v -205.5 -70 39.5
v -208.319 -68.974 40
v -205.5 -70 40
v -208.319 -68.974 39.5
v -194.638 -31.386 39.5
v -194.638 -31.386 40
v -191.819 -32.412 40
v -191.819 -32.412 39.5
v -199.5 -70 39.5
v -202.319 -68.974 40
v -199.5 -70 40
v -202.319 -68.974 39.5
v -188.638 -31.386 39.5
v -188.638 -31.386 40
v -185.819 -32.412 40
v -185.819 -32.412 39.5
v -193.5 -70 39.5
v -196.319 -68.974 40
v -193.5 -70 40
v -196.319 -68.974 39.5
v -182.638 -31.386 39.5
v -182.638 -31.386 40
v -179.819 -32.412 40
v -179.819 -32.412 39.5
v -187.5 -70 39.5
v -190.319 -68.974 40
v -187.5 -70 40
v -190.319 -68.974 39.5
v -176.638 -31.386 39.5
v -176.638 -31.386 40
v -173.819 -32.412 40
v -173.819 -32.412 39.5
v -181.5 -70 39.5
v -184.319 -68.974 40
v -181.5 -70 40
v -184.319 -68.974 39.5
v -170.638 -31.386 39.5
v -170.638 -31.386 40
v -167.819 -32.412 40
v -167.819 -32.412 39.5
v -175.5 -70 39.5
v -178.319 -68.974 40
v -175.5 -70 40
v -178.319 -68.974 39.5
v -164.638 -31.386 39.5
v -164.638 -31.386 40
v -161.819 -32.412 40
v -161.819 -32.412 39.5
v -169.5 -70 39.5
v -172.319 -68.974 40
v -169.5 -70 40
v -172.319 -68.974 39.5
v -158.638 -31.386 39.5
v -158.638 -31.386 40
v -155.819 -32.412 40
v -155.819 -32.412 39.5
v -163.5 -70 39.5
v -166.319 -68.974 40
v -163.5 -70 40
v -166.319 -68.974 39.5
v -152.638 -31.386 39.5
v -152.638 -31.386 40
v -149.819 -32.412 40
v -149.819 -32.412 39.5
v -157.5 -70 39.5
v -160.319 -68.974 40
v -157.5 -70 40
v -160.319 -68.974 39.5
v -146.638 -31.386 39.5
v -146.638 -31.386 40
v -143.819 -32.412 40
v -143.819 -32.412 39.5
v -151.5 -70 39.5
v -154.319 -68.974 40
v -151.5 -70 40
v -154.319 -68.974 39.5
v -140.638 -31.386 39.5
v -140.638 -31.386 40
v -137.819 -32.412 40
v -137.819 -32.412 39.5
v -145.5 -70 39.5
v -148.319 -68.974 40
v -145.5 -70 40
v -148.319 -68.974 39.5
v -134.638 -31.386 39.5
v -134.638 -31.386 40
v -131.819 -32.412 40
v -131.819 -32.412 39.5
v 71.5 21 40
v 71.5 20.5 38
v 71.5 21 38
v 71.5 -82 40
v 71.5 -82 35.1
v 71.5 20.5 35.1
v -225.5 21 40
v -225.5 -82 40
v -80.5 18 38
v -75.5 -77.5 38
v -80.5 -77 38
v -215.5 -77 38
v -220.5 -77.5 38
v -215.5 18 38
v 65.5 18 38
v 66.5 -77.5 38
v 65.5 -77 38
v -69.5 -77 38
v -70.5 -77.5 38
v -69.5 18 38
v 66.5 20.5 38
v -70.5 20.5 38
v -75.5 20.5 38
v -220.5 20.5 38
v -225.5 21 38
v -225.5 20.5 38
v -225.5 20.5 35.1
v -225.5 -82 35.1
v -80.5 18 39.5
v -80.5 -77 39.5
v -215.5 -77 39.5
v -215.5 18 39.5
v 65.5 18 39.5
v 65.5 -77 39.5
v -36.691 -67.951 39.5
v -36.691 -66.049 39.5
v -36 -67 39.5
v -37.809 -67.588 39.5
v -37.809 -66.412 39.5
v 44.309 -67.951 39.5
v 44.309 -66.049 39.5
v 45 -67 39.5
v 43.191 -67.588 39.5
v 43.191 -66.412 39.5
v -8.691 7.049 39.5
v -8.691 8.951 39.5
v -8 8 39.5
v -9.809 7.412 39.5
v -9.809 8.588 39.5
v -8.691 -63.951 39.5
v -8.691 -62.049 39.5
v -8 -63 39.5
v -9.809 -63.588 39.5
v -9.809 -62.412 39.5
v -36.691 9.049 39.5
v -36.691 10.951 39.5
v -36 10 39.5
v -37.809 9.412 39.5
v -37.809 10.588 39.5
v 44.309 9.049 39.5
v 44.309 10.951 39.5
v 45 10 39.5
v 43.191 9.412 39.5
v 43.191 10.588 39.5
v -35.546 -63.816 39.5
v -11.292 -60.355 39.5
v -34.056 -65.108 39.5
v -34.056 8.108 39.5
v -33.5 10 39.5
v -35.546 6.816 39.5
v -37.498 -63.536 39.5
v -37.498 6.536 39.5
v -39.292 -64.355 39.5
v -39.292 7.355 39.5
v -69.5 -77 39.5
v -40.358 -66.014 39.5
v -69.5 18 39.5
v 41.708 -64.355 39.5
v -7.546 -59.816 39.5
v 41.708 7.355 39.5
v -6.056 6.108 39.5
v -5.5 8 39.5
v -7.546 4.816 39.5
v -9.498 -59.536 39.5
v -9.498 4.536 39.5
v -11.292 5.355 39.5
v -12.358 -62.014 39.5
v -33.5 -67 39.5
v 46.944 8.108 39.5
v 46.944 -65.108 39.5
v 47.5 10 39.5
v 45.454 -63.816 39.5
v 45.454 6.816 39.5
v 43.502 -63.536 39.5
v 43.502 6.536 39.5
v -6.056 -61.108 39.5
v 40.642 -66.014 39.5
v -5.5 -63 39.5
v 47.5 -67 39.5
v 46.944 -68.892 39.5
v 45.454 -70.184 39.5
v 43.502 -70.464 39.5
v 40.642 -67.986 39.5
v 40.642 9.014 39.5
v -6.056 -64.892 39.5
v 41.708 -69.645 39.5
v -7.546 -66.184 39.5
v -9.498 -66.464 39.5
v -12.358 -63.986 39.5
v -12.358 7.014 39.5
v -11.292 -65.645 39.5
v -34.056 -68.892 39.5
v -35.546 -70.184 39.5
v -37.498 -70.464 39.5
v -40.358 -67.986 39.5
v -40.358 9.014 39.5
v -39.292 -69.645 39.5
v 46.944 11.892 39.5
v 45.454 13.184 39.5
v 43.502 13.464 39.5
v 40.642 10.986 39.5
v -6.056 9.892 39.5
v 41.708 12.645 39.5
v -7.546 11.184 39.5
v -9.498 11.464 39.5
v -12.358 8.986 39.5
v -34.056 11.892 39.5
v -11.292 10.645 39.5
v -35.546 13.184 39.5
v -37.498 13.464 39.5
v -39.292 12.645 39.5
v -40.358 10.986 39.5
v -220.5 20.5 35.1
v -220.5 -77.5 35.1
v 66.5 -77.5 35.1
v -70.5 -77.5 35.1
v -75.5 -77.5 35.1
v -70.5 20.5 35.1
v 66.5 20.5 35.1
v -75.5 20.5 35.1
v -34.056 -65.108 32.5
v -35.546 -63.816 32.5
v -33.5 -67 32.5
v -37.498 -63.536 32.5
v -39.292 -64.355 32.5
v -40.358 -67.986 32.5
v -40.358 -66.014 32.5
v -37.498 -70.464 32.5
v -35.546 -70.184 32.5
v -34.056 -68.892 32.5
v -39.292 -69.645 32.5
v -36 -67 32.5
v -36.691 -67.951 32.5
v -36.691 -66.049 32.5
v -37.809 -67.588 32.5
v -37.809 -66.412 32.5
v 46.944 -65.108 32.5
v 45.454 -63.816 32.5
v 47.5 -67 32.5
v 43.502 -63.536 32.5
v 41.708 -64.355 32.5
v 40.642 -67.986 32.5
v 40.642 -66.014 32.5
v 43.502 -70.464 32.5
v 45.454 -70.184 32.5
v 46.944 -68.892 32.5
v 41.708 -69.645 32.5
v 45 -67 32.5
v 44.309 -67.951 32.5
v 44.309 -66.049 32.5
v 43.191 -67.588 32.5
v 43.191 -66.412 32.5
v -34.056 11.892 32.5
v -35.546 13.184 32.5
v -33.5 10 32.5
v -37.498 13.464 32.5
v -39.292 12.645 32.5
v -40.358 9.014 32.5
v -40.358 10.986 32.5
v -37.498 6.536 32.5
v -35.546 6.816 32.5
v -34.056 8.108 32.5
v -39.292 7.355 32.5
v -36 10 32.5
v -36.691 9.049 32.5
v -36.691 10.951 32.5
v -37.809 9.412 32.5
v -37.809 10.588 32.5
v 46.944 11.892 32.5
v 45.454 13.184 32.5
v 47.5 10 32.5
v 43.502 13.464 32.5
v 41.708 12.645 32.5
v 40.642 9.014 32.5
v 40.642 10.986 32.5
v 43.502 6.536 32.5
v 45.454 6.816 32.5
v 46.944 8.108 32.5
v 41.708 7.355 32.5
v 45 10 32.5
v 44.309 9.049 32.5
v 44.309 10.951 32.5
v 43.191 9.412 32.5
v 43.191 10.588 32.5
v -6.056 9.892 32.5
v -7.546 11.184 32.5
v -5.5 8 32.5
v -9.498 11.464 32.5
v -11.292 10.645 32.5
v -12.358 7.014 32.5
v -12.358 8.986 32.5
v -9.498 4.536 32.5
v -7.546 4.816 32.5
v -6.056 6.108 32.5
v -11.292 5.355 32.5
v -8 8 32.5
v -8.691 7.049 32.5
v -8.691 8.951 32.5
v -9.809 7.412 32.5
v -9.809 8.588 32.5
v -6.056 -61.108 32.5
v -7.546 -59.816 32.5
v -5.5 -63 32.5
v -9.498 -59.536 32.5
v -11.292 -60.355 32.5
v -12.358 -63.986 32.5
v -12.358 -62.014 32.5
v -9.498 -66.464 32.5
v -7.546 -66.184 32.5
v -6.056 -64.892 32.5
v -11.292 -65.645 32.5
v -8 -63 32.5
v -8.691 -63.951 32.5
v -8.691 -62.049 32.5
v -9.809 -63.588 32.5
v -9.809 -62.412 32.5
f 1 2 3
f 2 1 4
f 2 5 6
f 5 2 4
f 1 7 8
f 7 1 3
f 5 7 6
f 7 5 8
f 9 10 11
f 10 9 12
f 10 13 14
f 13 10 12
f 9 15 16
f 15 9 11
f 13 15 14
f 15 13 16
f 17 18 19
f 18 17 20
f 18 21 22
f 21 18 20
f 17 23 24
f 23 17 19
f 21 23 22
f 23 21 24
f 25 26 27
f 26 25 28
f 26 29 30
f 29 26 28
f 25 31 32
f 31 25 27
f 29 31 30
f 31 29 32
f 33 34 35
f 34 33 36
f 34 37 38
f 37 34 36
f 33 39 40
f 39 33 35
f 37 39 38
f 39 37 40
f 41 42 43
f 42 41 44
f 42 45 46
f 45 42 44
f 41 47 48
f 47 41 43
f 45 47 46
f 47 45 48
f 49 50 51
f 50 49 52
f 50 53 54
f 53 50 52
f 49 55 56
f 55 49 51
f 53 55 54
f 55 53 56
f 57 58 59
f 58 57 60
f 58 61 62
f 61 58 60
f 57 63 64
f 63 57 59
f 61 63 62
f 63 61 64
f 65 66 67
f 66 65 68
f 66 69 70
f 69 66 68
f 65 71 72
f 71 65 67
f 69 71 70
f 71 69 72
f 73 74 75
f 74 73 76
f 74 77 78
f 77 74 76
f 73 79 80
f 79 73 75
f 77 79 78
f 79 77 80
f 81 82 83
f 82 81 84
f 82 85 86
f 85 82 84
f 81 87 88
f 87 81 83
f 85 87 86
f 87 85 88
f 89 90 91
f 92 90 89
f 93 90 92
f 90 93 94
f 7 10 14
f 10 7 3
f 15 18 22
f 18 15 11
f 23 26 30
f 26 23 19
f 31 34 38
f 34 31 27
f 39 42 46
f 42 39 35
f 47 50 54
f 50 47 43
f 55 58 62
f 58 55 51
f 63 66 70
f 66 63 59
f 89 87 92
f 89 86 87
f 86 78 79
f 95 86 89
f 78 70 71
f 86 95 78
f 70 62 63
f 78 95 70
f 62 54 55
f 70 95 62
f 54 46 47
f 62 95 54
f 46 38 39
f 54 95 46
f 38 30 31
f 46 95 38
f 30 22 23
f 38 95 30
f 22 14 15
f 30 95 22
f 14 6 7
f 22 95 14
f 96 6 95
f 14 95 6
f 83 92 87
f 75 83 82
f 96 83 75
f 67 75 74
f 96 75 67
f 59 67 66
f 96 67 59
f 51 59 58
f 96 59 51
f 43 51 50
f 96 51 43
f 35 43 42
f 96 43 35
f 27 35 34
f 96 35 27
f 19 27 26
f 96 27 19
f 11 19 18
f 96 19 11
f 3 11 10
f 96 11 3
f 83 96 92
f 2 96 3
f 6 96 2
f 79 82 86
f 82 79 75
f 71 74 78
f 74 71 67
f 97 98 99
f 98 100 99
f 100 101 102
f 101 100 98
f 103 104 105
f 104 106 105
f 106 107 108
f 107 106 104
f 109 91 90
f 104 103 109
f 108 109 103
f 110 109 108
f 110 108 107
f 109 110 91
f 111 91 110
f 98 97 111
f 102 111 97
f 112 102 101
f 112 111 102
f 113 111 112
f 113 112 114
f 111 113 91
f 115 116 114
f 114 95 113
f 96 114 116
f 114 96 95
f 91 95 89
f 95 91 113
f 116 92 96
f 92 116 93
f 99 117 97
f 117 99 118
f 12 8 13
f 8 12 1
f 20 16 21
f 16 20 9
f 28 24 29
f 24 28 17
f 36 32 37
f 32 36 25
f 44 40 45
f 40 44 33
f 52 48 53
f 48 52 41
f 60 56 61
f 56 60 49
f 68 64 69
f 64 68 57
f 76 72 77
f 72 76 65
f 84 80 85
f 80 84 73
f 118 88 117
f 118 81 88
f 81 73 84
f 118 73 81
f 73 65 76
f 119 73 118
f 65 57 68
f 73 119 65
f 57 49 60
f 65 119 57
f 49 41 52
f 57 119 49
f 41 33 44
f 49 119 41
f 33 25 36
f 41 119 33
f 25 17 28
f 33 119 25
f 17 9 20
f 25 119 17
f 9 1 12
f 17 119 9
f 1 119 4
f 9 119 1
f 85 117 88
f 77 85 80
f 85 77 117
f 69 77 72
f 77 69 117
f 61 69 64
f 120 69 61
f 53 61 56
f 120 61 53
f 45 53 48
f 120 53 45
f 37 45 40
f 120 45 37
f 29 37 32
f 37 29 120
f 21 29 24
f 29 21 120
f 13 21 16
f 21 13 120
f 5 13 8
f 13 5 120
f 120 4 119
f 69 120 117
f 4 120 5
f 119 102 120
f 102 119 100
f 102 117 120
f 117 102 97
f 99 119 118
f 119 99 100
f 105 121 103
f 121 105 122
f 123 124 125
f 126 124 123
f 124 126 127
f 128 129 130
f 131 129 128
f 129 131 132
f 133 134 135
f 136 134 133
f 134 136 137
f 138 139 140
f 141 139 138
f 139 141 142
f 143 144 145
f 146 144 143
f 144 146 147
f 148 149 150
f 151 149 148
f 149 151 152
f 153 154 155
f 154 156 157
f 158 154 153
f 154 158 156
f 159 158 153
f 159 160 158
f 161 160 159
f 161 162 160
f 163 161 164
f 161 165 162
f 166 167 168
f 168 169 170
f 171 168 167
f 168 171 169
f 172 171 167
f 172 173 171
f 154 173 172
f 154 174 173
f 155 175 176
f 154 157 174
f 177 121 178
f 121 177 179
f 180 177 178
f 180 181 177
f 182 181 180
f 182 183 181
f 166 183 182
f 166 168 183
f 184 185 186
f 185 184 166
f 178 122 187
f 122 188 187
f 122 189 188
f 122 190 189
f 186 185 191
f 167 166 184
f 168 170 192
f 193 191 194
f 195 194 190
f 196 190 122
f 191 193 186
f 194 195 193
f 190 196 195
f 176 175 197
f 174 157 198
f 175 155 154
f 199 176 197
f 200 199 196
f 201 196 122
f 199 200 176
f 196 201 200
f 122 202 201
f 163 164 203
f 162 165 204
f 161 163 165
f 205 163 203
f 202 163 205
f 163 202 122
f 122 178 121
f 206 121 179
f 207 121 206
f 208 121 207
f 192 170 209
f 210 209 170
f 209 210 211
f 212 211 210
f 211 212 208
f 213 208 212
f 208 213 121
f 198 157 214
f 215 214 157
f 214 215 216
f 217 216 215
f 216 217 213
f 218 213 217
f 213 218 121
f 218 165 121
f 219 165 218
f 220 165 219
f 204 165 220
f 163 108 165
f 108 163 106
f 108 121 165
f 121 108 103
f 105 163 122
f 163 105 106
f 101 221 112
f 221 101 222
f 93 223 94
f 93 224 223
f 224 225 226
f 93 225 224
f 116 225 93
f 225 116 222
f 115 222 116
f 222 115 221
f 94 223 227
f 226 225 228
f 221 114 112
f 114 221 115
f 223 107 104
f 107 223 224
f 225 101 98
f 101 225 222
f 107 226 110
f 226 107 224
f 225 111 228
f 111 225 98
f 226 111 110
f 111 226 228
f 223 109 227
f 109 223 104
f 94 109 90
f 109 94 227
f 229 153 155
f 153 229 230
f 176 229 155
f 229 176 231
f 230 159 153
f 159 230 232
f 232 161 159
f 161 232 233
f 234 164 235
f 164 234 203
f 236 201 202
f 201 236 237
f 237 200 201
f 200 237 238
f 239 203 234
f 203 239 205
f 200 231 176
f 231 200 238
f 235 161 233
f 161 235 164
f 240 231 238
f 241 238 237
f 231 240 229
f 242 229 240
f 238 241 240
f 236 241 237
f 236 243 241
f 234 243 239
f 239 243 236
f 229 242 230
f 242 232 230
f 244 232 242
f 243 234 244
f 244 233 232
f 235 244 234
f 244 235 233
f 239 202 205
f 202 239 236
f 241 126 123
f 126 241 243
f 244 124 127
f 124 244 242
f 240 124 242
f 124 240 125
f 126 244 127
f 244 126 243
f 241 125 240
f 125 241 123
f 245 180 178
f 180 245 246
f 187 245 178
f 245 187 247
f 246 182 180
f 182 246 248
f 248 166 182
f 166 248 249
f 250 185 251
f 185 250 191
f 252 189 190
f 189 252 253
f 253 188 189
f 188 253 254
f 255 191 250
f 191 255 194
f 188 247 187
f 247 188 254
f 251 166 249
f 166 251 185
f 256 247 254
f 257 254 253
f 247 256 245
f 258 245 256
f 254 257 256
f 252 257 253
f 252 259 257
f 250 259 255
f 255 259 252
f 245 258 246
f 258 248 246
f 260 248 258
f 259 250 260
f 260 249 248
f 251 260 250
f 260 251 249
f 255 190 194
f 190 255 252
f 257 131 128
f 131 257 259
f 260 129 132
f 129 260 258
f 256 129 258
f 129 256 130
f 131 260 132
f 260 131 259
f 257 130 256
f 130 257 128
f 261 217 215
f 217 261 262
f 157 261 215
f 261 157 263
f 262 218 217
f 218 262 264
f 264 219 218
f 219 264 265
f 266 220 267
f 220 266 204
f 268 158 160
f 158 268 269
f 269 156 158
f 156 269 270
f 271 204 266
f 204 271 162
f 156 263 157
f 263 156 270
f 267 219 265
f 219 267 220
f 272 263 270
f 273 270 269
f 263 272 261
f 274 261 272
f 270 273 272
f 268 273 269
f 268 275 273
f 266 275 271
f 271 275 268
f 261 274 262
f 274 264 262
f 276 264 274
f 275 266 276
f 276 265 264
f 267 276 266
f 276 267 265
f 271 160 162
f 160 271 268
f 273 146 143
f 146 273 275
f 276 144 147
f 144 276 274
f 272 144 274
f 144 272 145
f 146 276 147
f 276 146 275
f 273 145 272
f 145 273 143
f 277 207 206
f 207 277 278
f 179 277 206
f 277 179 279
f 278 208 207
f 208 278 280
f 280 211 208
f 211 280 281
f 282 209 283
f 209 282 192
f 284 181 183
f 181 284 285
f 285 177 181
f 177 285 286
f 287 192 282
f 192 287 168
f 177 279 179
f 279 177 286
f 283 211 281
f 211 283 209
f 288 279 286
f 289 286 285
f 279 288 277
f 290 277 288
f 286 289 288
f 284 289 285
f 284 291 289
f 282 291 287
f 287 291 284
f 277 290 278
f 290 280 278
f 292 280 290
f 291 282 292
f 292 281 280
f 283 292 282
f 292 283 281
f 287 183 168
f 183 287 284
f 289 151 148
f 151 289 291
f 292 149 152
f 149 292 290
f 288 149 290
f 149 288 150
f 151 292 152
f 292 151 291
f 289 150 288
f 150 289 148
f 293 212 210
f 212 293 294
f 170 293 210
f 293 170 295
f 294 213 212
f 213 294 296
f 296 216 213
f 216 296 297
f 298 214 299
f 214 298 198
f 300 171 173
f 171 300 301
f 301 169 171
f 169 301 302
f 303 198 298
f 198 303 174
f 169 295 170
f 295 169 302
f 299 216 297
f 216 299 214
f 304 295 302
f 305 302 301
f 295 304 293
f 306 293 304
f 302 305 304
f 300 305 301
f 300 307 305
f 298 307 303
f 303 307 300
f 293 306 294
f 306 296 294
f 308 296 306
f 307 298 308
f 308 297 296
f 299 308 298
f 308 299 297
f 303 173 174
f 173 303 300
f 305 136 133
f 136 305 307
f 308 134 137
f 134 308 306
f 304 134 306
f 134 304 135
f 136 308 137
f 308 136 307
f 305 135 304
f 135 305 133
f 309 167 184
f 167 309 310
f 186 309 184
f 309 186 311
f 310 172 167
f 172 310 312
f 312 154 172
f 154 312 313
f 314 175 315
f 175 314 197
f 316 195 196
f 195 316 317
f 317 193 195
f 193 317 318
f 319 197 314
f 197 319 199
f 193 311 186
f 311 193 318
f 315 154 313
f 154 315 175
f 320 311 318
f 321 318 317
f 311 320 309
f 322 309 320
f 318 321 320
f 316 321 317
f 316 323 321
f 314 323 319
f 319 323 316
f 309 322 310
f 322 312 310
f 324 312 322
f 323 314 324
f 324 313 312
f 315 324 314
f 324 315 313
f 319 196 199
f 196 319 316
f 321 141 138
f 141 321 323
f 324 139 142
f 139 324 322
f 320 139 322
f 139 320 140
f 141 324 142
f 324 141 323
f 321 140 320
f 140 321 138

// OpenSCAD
module prizm_add_dfask(n, height, rib, r_fask, fn_fask, center = false)
{
  r = rib/sqrt(3);
  minkowski()
  {
    cylinder(height/2, r, r, $fn=n, center);
    cylinder(height/2, r_fask, r_fask, $fn=fn_fask*32, center);
  }
}

//базовая призма
module prizm_side(n, w, h, r, center = true)
{
  rotate([0,-90,180])
  {
    prizm_add_dfask(n, w, h, r,16, center);
  }
}
//призма - труба
module prizm_box(n, w, h, r, t, center = true)
{
  r2 = (r-t < 0) ? 0.1 :  r-t;
  rotate([0,-90,180]) difference()
  {
    prizm_add_dfask(n, w, h, r,16, center);
    translate([0,0,-0.5])prizm_add_dfask(n, w+3, h, r2,16, center);
  }
}



 //толщина платы
plateThickness=4;
//размер кнопки взят из даташита на cherry
lkey=19.05;
//Hole size, from Cherry MX data sheet
holesize=14;
//length, in units, of board
width2=15.6;
//Height, in units, of board
height2=6;
//Radius of mounting holes
mountingholeradius=2;
//height of switch clasp cutouts
cutoutheight = 3;
//width of switch clasp cutouts
cutoutwidth = 1;

//calculated vars

holediff=lkey-holesize;
w2=width2*lkey;
h3=height2*lkey;





h=268;
r=10;
t= 5; // толщина корпуса
w=147;
z = h/(sqrt(3)*2) + r;
h2=40;
ts = 8; // толщина боковой стенки
ts2 = 5;



 
 
 





digit_holes = [
        [[0,1],1],
        [[1,1],1],
        [[2,1],1],
        [[3,1],1],
        [[4,1],1],
        [[5,1],1],
        [[6,1],1],
        [[7,1],1],
        [[8,1],1],
        [[9,1],1],
        [[10,1],1],
        [[11,1],1],
        [[12,1],1],
        [[13,1],1],
        [[14,1],1.5],//backspace
        ];

// keyboard layout layer
kr04keyboard = [
//start ROW 0
[[0,0],1.5],//k1
[[1.5,0],1.5],  //k2
[[3,0],1.5],//k3
[[4.5,0],1.5],  //k4
[[6,0],1.5],//k5
[[9,0],1.5],
[[10.5,0],1.5],
[[12.5,0],1.5],
[[14,0],1.5],
//ROW1

//row2
[[0,2],1.5],//tab
[[1.5,2],1],
[[2.5,2],1],
[[3.5,2],1],
[[4.5,2],1],
[[5.5,2],1],
[[6.5,2],1],
[[7.5,2],1],
[[8.5,2],1],
[[9.5,2],1],
[[10.5,2],1],
[[11.5,2],1],
[[12.5,2],1],
[[13.5,2],1],
[[14.5,2],1],//enter up
//row3
[[0,3],1.75],//upr
[[1.75,3],1],
[[2.75,3],1],
[[3.75,3],1],
[[4.75,3],1],
[[5.75,3],1],
[[6.75,3],1],
[[7.75,3],1],
[[8.75,3],1],
[[9.75,3],1],
[[10.75,3],1],
[[11.75,3],1],
[[12.75,3],1.25],
[[14,3],2],
//row4
[[0,4],1.25],
[[1.25,4],1],
[[2.25,4],1],
[[3.25,4],1],
[[4.25,4],1],
[[5.25,4],1],
[[6.25,4],1],
[[7.25,4],1],
[[8.25,4],1],
[[9.25,4],1],
[[10.25,4],1],
[[11.25,4],1.25],
[[12.5,4],1],
[[13.5,4],1],
[[14.5,4],1],
//row5
[[0,5],2],
[[2,5],1.25],


[[10.5,5],2],
[[12.5,5],1],
[[13.5,5],1],
[[14.5,5],1],

];



module plate(w2,h3){
	cube([w2,h3,plateThickness]);
}

module switchhole(){
	union(){
		cube([holesize,holesize,plateThickness]);

		translate([-cutoutwidth,1,0])
		cube([holesize+2*cutoutwidth,cutoutheight,plateThickness]);

		translate([-cutoutwidth,holesize-cutoutwidth-cutoutheight,0])
		cube([holesize+2*cutoutwidth,cutoutheight,plateThickness]);
	}
}

module holematrix(holes,startx,starty){
	for (key = holes){
		translate([startx+lkey*key[0][0], starty-lkey*key[0][1], 0])
		translate([(lkey*key[1]-holesize)/2,(lkey - holesize)/2, 0])
		switchhole();
	}
}

module mountingholes(){
	translate([6,9,0])
	cylinder(h=plateThickness,r=mountingholeradius, $fn=12);
    translate([65,9,0])
	cylinder(h=plateThickness,r=mountingholeradius, $fn=12);
    translate([110,9,0])
	cylinder(h=plateThickness,r=mountingholeradius, $fn=12);
    translate([200,9,0])
	cylinder(h=plateThickness,r=mountingholeradius, $fn=12);
    translate([155,104,0])
	cylinder(h=plateThickness,r=mountingholeradius, $fn=12);
    translate([28,104,0])
	cylinder(h=plateThickness,r=mountingholeradius, $fn=12);
    translate([266,104,0])
	cylinder(h=plateThickness,r=mountingholeradius, $fn=12);
    translate([269,48,0])
	cylinder(h=plateThickness,r=mountingholeradius, $fn=12);
    translate([30,48,0])
	cylinder(h=plateThickness,r=mountingholeradius, $fn=12);
}

module kr04plate(){
	     difference(){
		 plate(w2,h3);
		 translate([0,0,-0.1]) scale([1,1,1.05]) holematrix(kr04keyboard,0,h3-lkey);
            translate([3,0,-0.1]) scale([1,1,1.05])holematrix(digit_holes,0,h3-lkey);

        
		translate([0,0,-0.1]) scale([1,1,1.05]) mountingholes();
        translate([74,2.5,-0.1]) scale([1,1,1.05]) switchhole();
        translate([124,2.5,-0.1]) scale([1,1,1.05]) switchhole();
        translate([174,2.5,-0.1]) scale([1,1,1.05]) switchhole();
	}
}
zw=169;
 module pravy_chast()
intersection()
{
  //translate([0,50,h2/2])cube([169,h,h2],true); // уберем треугольник оставим санки # - подсветка  
      translate([0,50,h2/2])
  {
    hull()
    {  
      translate([0,-h/2+55.5,0]) cube([zw,111,h2],true); // уберем треугольник оставим санки # - подсветка   
      translate([0,h/2-1,-10])cube([zw,2,h2-20],true); // уберем треугольник оставим санки # - подсветка   
    }
  }
  translate([0,0,z]) //rotate([0,0,0]) 
  union()
  {  
      difference() { 
       translate([8,0,-0])prizm_box(3, 153, h, r, t);
       translate([-74,130,-65]) cube([159,6,5],false);   // фаска под клаву спереди 
       translate([-68,-87,-87.5]) cube([140,110,6],false); //дыра внизу 1
       translate([-68,37,-87.5])  cube([140,100,6],false);  //дыра внизу 2
       translate([-70,-87,-87.5]) cube([142,114,2.5],false); //фаска под дырку 1
       translate([-70,34,-87.5])  cube([142,104,2.5],false); //фаска под дырку 2
       //translate([-70,-80,-87.5]) cube([142,4,2.5],false); // фаска 
        translate([70,-83,-87.5]) cube([5,110,2.5],false); //фаска под дырку 1
          translate([70,34,-87.5]) cube([5,104,2.5],false); //фаска под дырку 1
      }
      difference() {
      translate([-70,0,0])prizm_side(3, ts2, h, r, 20); // боковая стенка
      translate([-64,-100,-52]) rotate([0,0,90]) cube([237,4,5],false);
      translate([-63,-92,-87.5]) rotate([0,0,90])  cube([230,4,2.5],false);
      translate([-64,18,-51.5])   rotate([0,6.8,90])  cube([126.7,4,5],false);//фаска на клаву на боковой стенке  
      }
      difference() {
       translate([-70,-86,-87.5]) cube([155,6,40],false);// задняя стенка
       translate([-70,-83,-52]) rotate([0,0,0]) cube([155,6,5],false); // фаска под крышку
       translate([-70,-83,-87.5]) rotate([0,0,0]) cube([145,4,2.5],false); // фаска под крышку снизу
       translate([-10,-78,-71]) rotate([90,0,00]) cube([56,12,6.5],false);
  //translate([-15,-85,-66]) rotate([90,0,00])#cylinder($fn = 0, h = 15, r1 = 1, r2 = 1, center = false);
  //translate([48,-85,-66]) rotate([90,0,00])#cylinder($fn = 0, h = 15, r1 = 1, r2 = 1, center = false);
       //translate([60,-86.5,-59]) rotate([90,180,0])cube([9,14,6.5],false);// выключатель
       translate([-45,-78.5,-66]) rotate([90,180,0]) cylinder($fn = 0, h = 7, r1 = 8, r2 = 7.8, center = false); //питание  
       translate([169/2,-78,-63]) rotate([90,180,0]) cube([9,14,3],false);// вставка для скрепления
      }
  }
  // translate([-0.5,5,34]) cube([237,6.5,6],false);
 }
 
 module levy_chast()
intersection()
{
  translate([0,50,h2/2])
  {
    hull()
    {  
      translate([0,-h/2+55.5,0]) cube([w,111,h2],true); // уберем треугольник оставим санки # - подсветка   
      translate([0,h/2-1,-10])cube([w,2,h2-20],true); // уберем треугольник оставим санки # - подсветка   
    }
  }
    
  translate([0,0,z]) //rotate([0,0,0]) 
  union()
  {  
      difference() { 
       prizm_box(3, w, h, r, t);
       translate([-74,130,-65]) cube([146,6,6],false); //фаска под клаву передняя   
       translate([-68,-80,-87.5]) cube([140,100,6],false); //дыра внизу 1
       translate([-68,37,-87.5]) cube([140,100,6],false);  //дыра внизу 2
       translate([-70,-82,-87.5]) cube([142,105,2.5],false); //фаска под дырку 1
       translate([-70,33,-87.5])  cube([142,105,2.5],false); //фаска под дырку 2
       //translate([-70,-80,-92.5])  #cube([142,4,2.5],false); // фаска 
        //translate([-74,-82,-89]) #cube([4,220,2],false); //фаска под дырку 1
      }
      difference() 
      {
        translate([w/2-ts/2,0,0])prizm_side(3, ts, h, r, 20); // боковая стенка
          translate([72,-82,-87.5]) rotate([0,0,90]) cube([105,4,2.5],false);//фаска снизу на боковой стенке
       translate([72,-100,-51.5]) rotate([0,0,90]) cube([237,4,5],false);//фаска сверху на боковой стенке
       translate([72,18,-51.5]) rotate([0,6.8,90]) cube([126.7,4,5],false);//фаска на клаву на боковой стенке  
        translate([72,33.1,-87.7]) rotate([0,0,90])  cube([105,4,2.5],false);
      }
      difference() {
       translate([-w/2,-86,-87.5])cube([147,6,40],false);// задняя стенка
       translate([-70,-83,-87.5]) rotate([0,0,0]) cube([146,4,3],false); // фаска под крышку снизу
       translate([-74,-83,-52]) rotate([0,0,0]) cube([146,4,5],false); // фаска под крышку
       translate([60,-79,-59]) rotate([90,180,0])cube([9,14,6.5],false);// выключатель
       translate([25,-78.5,-66]) rotate([90,180,0]) cylinder($fn = 0, h = 7, r1 = 8, r2 = 7.8, center = false); //питание  
       translate([-65,-78.5,-63]) rotate([90,180,0])cube([9,14,3],false);// выключатель
      }
  }
  // translate([-0.5,5,34]) cube([237,6.5,6],false);
 }
 
 module stoyka(x,y)
{
    translate([x,y,32.5])
 difference() {
 cylinder($fn = 0, h = 7, r1 = 3.5, r2 = 3.5, center = false);
 cylinder($fn = 0, h = 7.5, r1 = 1, r2 = 1, center = false);   
    
}
}
 
 module top_case()
 {
      difference() {
          
     cube([297,103,2],false);
     translate([10,5,-0.5])cube([135,95,2],false);
     translate([156,5,-0.5])cube([135,95,2],false);
     for (i=[140:6:200])
     translate([i-120,12,-0.5])rotate([00,00,70])cube([40,3,8],false);
    }


    translate([0,4.5,-2.9])   cube([5,98,3],false);
    translate([150,4.5,-2.9]) cube([5,98,3],false);
    translate([292,4.5,-2.9]) cube([5,98,3],false);
    translate([0,0,-2.9]) cube([297,4.5,3],false);   
 }
 
 
 
  //levy_chast();
  //translate([-225.5,22,36] ) rotate([-7,0,0])kr04plate();
  //translate([-158,0,0]) pravy_chast();
 translate([-225.5,-82,38] )top_case();
 stoyka(-37,-67);
 stoyka(44,-67);
    
   stoyka(-37,10);
   stoyka(44,10);
  stoyka(-9,8);
  stoyka(-9,-63);
 //translate([-40,-70,38] )cube([89,82,2],false);
 
 
 
